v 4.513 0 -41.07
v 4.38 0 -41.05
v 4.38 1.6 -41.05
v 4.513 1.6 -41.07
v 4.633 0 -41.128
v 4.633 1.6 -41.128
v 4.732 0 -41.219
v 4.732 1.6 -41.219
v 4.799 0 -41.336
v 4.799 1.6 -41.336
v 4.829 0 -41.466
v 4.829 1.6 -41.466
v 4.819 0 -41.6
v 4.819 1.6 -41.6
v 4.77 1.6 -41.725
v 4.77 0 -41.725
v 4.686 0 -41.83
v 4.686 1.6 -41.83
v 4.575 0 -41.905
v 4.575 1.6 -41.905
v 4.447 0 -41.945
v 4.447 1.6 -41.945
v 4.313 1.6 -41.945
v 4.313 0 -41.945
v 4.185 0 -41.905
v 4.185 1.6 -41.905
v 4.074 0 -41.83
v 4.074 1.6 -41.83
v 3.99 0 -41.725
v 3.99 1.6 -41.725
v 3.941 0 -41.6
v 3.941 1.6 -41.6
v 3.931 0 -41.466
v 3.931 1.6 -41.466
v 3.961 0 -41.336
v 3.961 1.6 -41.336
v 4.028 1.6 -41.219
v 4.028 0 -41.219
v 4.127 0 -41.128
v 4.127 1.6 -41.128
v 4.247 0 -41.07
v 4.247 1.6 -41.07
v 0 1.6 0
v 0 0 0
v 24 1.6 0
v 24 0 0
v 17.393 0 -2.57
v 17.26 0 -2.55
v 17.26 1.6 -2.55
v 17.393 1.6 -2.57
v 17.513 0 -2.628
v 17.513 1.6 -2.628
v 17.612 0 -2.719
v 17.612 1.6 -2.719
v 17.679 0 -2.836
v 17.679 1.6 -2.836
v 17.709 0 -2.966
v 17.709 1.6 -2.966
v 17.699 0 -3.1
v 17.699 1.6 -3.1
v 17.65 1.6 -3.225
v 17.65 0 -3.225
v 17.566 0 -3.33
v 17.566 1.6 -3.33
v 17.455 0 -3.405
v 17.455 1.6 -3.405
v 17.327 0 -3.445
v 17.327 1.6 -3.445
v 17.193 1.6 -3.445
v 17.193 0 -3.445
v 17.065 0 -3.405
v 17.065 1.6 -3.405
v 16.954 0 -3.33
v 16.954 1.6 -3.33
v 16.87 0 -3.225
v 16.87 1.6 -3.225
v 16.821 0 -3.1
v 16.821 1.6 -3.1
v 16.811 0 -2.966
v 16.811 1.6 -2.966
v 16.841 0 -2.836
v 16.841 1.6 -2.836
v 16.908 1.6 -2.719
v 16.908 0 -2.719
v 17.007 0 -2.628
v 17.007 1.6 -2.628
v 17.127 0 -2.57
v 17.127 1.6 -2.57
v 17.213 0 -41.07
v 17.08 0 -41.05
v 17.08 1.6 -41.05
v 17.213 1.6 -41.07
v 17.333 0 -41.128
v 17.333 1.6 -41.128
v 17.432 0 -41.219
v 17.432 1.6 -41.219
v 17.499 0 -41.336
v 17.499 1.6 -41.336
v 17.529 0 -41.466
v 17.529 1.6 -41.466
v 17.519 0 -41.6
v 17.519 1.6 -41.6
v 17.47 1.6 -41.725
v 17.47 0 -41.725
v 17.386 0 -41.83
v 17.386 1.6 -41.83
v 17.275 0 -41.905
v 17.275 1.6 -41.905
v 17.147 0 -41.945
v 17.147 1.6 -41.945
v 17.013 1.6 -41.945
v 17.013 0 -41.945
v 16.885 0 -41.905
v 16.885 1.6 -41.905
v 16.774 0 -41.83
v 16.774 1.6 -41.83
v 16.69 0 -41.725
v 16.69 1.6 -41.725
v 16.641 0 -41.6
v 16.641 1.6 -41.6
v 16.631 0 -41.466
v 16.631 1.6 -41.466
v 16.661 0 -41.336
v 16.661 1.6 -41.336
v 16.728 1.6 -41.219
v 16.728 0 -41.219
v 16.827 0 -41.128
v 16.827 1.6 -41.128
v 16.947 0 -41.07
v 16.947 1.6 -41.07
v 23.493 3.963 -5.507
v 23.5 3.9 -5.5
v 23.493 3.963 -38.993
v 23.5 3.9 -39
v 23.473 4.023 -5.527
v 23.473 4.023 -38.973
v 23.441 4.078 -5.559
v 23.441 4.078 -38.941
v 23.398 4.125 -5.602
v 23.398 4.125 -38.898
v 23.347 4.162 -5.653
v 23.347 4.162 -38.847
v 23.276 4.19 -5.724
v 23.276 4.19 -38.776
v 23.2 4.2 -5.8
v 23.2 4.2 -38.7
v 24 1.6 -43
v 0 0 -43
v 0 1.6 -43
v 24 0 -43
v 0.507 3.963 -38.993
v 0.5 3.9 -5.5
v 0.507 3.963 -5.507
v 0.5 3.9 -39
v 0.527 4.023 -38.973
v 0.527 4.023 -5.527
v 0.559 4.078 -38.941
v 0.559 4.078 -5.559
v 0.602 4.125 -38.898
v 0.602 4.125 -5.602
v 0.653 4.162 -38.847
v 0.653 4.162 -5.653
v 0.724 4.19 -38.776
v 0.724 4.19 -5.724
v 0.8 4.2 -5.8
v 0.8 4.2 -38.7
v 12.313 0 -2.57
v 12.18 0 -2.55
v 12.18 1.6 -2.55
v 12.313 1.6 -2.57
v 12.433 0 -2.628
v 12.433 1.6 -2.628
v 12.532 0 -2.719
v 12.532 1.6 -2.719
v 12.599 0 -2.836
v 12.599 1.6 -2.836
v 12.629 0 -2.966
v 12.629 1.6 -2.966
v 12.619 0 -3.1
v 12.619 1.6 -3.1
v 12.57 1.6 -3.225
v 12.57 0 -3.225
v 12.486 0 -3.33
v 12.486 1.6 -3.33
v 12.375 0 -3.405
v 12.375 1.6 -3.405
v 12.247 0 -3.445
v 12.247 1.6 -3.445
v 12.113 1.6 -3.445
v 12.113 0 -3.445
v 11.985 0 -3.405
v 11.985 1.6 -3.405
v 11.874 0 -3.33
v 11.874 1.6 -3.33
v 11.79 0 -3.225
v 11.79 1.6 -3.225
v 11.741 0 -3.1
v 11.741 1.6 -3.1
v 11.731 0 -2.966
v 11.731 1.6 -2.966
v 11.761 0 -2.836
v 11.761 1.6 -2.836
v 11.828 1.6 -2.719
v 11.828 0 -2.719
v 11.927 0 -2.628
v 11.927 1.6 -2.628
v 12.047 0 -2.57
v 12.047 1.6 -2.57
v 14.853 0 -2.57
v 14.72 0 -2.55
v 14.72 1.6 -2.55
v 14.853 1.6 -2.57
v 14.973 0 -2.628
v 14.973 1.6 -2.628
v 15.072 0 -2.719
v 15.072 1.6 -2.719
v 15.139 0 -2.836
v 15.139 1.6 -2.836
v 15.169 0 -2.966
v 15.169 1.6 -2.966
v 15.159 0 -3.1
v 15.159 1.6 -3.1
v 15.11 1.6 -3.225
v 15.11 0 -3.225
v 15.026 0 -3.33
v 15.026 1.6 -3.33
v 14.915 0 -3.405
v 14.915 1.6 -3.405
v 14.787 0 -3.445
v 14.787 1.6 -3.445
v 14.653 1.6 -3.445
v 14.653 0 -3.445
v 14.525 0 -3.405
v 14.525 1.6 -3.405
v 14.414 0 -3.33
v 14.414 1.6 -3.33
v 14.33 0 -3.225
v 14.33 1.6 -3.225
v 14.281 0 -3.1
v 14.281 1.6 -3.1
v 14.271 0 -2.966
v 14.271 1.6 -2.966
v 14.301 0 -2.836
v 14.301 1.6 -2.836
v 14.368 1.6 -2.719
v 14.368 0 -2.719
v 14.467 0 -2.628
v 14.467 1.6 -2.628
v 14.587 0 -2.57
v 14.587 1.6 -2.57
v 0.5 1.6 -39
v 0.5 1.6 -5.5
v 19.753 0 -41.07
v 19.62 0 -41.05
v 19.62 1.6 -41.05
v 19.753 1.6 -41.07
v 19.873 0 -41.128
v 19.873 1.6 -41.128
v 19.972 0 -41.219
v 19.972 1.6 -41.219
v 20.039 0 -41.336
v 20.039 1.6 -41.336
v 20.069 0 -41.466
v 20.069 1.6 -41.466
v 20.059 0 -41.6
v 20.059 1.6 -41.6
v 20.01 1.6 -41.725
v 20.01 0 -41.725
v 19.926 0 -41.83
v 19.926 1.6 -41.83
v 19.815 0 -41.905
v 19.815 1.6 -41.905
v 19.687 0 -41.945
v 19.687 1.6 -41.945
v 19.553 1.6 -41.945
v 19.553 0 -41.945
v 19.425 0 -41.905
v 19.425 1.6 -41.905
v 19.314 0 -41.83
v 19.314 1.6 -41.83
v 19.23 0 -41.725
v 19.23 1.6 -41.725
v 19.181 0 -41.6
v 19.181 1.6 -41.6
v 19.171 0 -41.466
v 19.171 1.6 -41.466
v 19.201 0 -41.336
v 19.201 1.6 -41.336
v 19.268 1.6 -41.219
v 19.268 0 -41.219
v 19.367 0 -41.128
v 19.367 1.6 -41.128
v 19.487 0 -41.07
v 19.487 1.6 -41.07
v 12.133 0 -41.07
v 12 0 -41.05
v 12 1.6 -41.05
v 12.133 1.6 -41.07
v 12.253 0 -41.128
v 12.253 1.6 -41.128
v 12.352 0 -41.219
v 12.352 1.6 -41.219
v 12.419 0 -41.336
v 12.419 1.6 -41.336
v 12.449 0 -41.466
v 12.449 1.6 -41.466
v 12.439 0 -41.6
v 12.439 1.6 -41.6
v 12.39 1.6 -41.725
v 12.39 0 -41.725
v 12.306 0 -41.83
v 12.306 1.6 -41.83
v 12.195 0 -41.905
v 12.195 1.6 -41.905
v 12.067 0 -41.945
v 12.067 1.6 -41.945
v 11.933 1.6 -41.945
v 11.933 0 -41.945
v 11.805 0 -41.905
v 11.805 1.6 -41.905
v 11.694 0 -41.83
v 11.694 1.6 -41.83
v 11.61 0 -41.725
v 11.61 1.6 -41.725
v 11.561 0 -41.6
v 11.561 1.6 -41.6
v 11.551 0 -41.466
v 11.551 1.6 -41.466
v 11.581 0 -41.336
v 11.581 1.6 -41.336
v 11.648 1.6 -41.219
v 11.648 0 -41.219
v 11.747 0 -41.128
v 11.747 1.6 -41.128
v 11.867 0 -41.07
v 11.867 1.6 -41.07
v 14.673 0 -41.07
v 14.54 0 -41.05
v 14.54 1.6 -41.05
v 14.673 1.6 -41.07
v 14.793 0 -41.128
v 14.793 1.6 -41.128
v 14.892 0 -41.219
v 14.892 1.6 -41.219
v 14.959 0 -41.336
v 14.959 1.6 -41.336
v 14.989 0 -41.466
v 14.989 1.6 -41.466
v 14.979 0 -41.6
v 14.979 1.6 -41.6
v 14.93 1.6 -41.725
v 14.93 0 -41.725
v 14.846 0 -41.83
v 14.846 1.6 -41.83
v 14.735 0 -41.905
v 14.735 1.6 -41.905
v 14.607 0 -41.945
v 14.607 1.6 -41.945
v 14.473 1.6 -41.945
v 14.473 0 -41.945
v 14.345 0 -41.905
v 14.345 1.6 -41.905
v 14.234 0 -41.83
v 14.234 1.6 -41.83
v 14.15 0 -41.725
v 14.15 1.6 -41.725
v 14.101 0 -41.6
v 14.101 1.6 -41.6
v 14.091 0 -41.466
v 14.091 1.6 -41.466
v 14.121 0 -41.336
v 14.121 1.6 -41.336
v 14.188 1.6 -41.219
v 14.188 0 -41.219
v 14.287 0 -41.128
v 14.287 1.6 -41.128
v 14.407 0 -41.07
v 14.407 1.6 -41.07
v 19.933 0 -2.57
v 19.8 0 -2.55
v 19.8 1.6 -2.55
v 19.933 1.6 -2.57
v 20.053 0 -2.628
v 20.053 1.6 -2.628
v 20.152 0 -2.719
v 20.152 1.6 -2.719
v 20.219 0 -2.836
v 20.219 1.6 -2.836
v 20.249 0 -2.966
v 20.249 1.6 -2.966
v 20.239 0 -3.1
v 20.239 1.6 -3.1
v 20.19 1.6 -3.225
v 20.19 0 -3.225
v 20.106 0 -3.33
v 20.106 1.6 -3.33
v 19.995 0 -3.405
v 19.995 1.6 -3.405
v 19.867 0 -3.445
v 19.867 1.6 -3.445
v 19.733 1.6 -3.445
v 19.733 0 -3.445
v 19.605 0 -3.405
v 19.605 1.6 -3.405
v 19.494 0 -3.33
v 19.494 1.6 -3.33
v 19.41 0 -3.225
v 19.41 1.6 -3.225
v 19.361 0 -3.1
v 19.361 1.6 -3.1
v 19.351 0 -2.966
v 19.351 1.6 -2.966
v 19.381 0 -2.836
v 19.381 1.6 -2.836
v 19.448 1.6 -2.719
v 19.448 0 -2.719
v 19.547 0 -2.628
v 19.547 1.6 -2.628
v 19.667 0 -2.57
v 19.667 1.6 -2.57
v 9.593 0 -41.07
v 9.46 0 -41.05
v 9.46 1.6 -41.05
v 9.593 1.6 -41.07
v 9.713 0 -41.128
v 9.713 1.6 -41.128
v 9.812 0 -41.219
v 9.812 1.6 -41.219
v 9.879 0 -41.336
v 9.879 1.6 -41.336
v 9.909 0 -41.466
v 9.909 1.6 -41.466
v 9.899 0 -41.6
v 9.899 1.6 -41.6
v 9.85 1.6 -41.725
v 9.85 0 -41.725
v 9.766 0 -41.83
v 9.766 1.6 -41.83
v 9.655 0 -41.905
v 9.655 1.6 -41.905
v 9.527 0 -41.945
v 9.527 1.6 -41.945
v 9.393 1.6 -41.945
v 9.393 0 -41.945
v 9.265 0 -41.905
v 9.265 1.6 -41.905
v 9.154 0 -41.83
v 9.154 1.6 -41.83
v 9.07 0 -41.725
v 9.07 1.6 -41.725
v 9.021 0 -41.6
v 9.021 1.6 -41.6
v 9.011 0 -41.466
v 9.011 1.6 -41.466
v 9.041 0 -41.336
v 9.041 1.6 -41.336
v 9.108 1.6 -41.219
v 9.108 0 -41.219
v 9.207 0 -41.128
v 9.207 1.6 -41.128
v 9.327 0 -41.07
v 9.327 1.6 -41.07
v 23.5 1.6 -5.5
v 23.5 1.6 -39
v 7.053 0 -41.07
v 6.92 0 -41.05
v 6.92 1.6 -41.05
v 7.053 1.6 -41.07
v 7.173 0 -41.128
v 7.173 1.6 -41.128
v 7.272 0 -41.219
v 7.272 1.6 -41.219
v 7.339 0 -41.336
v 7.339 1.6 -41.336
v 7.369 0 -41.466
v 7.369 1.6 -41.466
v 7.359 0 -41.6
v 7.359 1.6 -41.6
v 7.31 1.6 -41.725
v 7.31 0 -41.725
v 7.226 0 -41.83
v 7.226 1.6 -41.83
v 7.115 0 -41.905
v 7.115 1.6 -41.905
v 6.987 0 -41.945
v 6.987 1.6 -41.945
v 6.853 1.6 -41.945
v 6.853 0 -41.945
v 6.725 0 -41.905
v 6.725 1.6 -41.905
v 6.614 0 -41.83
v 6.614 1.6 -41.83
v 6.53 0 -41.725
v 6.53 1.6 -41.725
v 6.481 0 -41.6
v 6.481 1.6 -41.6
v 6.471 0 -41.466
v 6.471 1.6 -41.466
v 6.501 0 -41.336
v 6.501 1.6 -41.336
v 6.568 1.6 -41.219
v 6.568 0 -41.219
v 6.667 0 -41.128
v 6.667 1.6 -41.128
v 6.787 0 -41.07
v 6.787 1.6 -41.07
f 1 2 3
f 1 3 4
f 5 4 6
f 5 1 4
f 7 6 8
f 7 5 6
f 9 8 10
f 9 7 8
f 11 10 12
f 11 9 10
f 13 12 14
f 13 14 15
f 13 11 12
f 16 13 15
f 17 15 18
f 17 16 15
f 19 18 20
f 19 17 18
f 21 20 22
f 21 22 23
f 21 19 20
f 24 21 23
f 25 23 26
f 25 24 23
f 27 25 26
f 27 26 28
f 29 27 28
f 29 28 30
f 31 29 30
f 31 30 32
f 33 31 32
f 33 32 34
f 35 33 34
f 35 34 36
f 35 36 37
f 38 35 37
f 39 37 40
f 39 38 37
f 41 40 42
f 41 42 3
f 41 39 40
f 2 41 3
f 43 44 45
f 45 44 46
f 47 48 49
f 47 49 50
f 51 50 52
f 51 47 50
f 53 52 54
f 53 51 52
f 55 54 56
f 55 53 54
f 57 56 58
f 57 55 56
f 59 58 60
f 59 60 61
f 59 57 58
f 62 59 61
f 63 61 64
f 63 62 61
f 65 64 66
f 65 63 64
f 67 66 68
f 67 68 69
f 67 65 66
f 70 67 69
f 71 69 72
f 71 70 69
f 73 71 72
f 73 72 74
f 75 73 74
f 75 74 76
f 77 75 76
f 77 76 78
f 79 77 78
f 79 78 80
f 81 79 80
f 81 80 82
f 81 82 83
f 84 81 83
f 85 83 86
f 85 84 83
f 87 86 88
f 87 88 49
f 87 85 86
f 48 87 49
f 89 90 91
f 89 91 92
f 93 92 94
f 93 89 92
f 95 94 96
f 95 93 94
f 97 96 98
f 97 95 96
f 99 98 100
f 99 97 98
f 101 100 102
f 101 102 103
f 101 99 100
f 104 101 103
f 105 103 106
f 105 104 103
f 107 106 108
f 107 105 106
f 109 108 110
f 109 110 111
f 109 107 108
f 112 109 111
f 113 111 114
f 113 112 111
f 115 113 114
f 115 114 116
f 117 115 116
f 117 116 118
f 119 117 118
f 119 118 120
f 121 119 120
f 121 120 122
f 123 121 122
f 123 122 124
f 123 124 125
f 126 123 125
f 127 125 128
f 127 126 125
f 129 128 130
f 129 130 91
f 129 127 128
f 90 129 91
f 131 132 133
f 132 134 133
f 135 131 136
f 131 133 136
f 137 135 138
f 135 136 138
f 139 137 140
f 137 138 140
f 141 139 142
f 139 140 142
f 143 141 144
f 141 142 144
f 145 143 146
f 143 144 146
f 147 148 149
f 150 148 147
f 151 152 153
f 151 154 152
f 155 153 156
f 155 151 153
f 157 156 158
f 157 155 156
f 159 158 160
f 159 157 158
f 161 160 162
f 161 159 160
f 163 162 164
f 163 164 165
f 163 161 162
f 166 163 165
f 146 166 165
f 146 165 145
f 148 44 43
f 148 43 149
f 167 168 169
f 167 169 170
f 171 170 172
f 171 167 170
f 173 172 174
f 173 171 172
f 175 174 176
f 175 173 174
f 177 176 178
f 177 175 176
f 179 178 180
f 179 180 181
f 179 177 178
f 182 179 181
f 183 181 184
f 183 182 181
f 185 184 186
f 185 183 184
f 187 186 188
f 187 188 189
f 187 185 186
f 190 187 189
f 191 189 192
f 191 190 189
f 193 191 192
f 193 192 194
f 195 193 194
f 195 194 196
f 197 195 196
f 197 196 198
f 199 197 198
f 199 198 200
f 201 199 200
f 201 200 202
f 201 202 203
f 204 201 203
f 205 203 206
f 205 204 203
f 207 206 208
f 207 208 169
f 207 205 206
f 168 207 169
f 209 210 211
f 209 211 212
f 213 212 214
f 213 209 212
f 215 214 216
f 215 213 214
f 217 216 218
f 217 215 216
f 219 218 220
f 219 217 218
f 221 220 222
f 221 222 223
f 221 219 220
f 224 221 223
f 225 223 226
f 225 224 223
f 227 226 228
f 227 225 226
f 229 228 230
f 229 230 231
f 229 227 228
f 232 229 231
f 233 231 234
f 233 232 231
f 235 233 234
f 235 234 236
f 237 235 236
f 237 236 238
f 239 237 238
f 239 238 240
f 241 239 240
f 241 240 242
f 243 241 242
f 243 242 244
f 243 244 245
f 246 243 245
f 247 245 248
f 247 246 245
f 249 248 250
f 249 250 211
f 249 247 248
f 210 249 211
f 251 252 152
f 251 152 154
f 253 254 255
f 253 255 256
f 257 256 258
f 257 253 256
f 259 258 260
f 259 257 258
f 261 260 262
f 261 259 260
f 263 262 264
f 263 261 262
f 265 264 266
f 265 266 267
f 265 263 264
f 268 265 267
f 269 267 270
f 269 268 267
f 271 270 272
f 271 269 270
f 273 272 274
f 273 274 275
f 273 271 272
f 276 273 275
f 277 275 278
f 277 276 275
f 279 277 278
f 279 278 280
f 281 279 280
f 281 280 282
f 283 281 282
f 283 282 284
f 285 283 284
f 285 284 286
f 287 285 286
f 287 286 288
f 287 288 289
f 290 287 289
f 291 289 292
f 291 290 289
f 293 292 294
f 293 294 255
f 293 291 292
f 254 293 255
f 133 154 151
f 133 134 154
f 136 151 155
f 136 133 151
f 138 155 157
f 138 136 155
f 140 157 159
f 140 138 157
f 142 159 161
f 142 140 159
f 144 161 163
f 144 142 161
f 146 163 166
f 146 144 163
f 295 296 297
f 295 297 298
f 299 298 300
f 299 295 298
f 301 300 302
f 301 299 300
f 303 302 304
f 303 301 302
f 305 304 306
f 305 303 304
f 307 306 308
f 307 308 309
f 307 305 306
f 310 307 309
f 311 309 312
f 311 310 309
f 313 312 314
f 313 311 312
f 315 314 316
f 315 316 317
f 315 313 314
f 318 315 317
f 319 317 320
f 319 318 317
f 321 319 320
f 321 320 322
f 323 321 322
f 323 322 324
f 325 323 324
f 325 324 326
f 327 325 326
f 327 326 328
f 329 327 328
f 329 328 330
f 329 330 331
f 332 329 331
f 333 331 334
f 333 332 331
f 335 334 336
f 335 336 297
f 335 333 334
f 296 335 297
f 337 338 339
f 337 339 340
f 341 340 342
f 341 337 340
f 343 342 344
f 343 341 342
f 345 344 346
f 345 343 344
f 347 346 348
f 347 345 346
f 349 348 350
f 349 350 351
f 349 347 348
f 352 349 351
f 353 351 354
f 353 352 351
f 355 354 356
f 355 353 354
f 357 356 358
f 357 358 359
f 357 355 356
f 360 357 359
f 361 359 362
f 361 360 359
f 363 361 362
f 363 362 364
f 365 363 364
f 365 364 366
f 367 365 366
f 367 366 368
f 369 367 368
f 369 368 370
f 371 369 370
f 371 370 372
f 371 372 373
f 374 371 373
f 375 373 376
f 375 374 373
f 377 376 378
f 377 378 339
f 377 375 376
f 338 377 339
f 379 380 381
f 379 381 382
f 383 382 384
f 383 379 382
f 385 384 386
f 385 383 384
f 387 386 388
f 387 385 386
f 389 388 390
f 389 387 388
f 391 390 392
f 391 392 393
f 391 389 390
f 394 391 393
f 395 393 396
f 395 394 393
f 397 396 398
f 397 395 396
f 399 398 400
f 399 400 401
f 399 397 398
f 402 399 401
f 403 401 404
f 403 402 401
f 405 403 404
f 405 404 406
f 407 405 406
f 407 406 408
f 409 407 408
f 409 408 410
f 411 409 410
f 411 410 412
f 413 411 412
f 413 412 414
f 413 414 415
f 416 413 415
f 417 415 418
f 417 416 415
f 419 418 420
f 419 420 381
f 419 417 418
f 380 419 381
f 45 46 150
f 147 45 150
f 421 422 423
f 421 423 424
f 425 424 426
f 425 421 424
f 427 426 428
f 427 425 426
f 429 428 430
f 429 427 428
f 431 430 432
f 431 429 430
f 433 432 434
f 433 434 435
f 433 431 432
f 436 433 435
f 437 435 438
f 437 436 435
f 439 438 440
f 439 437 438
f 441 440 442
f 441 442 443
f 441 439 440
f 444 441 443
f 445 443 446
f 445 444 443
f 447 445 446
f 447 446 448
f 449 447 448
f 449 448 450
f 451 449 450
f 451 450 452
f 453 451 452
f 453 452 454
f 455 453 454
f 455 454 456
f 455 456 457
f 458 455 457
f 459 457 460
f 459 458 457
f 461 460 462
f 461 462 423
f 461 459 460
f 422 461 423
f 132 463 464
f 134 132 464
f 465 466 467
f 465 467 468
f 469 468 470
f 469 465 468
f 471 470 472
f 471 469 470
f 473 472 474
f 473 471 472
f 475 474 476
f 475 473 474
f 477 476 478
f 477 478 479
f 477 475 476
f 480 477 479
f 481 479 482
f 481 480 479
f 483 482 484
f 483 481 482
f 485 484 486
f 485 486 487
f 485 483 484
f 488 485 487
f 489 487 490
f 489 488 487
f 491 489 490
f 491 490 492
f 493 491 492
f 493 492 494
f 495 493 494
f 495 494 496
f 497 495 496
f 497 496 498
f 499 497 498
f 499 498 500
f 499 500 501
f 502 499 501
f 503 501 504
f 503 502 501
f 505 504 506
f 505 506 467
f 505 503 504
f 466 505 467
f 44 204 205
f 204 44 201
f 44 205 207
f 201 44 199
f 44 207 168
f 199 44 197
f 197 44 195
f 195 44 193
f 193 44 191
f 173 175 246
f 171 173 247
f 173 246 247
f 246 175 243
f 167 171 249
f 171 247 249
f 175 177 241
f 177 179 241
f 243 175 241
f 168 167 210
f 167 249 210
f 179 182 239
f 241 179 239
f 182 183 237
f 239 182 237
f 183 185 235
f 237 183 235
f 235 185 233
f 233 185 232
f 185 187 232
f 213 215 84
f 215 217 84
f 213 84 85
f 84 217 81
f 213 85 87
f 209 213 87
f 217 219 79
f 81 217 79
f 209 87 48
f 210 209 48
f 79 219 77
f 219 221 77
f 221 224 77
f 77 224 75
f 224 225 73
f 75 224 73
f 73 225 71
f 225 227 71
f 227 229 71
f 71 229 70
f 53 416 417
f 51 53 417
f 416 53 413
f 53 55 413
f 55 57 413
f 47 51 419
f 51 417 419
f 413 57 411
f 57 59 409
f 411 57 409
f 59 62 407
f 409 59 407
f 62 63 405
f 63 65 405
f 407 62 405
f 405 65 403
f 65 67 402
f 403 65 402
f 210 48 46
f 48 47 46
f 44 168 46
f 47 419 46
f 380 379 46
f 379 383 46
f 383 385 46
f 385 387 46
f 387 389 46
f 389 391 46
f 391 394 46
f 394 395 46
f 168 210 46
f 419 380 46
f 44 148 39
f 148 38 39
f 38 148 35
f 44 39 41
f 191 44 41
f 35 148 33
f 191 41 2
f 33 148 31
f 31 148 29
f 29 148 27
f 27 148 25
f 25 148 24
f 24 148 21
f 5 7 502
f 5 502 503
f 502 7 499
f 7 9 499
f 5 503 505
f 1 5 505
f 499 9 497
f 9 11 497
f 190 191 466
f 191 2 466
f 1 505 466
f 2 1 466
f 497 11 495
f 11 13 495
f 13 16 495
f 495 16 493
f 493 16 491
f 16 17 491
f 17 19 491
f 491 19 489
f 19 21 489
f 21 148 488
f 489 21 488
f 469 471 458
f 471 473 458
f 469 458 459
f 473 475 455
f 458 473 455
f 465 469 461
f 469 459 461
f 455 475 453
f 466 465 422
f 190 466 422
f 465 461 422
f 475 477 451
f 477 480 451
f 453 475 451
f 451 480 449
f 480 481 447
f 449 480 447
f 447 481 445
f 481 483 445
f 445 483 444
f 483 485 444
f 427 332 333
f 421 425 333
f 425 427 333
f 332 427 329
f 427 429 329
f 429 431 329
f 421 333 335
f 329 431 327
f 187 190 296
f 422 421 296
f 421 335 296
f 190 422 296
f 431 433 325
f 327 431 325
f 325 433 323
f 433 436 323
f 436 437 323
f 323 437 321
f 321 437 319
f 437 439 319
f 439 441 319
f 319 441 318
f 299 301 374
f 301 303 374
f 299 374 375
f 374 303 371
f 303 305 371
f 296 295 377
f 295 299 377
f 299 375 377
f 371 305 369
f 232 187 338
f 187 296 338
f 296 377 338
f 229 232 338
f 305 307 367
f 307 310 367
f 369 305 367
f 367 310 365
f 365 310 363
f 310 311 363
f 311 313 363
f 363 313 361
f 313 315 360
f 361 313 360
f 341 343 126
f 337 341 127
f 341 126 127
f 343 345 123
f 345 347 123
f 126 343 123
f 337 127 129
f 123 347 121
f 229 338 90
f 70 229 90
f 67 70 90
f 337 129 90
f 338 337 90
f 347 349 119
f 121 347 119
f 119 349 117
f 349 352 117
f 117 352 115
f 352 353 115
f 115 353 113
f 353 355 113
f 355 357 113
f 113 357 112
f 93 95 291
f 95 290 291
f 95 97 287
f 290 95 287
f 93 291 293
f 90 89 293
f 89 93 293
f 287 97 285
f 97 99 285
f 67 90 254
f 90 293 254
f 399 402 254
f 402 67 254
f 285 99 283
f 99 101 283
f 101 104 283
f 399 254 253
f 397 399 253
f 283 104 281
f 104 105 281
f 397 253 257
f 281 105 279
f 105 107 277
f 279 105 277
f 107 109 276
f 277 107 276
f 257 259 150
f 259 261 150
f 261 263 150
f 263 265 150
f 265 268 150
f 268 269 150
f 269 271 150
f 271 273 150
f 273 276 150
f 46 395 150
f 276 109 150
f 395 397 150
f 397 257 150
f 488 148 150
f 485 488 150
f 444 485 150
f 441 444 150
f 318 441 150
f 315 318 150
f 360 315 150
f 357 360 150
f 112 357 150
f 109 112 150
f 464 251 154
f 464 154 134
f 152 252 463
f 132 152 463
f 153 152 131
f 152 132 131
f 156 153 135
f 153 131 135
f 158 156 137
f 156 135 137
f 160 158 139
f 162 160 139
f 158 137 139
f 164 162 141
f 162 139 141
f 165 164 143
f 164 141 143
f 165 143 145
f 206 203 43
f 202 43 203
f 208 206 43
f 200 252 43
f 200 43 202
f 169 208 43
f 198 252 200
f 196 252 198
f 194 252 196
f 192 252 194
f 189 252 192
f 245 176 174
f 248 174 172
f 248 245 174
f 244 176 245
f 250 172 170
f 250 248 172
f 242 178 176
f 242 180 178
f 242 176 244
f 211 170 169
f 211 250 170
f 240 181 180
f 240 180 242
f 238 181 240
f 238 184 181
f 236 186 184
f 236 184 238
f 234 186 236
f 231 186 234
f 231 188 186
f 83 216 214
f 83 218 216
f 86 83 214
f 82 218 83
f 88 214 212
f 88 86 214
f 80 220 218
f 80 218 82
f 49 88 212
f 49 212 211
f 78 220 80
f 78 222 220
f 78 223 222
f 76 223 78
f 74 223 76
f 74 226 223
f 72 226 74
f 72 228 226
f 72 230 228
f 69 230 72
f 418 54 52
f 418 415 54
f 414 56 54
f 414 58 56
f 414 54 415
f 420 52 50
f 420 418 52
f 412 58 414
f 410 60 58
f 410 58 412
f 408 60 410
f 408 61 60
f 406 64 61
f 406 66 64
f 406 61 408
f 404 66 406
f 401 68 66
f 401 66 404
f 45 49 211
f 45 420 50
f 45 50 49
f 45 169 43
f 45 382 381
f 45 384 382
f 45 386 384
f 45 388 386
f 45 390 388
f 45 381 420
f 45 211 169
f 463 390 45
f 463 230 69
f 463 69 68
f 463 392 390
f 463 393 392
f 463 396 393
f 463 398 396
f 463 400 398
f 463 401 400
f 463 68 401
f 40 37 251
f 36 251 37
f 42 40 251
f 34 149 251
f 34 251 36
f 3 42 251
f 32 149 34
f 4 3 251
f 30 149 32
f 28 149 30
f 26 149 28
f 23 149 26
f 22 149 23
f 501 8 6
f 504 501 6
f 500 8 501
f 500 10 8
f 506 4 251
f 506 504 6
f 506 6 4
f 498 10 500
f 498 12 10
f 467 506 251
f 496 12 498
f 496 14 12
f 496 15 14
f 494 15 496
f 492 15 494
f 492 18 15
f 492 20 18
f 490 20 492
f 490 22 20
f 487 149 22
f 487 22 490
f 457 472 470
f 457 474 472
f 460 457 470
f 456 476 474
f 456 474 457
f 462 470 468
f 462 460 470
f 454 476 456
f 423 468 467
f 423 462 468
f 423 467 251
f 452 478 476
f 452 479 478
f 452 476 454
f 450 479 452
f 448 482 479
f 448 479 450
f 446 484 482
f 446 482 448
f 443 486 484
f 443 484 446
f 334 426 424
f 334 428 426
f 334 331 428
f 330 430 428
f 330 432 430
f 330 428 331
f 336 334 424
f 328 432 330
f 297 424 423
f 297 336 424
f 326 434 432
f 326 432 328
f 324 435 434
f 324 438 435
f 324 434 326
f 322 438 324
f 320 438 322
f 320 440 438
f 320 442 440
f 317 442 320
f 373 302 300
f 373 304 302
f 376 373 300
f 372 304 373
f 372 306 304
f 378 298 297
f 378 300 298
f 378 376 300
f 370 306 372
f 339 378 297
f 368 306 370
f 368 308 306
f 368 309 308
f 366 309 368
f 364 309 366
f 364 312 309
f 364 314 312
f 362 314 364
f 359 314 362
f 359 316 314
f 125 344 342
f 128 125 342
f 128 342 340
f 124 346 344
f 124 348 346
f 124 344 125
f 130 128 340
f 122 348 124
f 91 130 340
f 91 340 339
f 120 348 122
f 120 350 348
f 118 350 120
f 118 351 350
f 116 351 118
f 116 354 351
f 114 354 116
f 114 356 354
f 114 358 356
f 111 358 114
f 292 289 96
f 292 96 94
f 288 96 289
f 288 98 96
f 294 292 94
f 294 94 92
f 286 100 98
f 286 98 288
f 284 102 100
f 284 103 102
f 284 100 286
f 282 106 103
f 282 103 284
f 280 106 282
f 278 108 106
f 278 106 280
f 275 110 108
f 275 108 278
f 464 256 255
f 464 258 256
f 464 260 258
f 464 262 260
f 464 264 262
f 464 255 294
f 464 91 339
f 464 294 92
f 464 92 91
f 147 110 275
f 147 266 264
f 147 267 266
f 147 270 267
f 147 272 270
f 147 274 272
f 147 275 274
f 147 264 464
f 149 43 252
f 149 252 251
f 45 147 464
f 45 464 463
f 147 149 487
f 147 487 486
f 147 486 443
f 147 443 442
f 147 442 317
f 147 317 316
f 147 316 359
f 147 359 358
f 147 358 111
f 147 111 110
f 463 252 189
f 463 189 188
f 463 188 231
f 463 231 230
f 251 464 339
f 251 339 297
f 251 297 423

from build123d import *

# Parameters (mm, degrees)
SKETCH1_W           = 24
SKETCH1_H           = 43
SKETCH1_R           = 0.45
BOSS_EXTRUDE1_DEPTH = 1.6
SKETCH2_W           = 23
SKETCH2_H           = 33.5
BOSS_EXTRUDE2_DEPTH = 2.6
FILLET1_R           = 0.3


with BuildPart() as part:
    # Sketch1 → Boss-Extrude1 (new body)
    with BuildSketch(Plane(origin=(0, 0, 0), x_dir=(1, 0, 0), z_dir=(0, 1, 0))):
        with Locations((12, 21.5)):
            Rectangle(SKETCH1_W, SKETCH1_H)
        with Locations(Location((19.62, 41.5, 0), (0, 0, 270))):
            Circle(SKETCH1_R, mode=Mode.SUBTRACT)
        with Locations(Location((17.08, 41.5, 0), (0, 0, 270))):
            Circle(SKETCH1_R, mode=Mode.SUBTRACT)
        with Locations(Location((14.54, 41.5, 0), (0, 0, 270))):
            Circle(SKETCH1_R, mode=Mode.SUBTRACT)
        with Locations(Location((12, 41.5, 0), (0, 0, 270))):
            Circle(SKETCH1_R, mode=Mode.SUBTRACT)
        with Locations(Location((9.46, 41.5, 0), (0, 0, 270))):
            Circle(SKETCH1_R, mode=Mode.SUBTRACT)
        with Locations(Location((6.92, 41.5, 0), (0, 0, 270))):
            Circle(SKETCH1_R, mode=Mode.SUBTRACT)
        with Locations(Location((4.38, 41.5, 0), (0, 0, 270))):
            Circle(SKETCH1_R, mode=Mode.SUBTRACT)
        with Locations(Location((19.8, 3, 0), (0, 0, 270))):
            Circle(SKETCH1_R, mode=Mode.SUBTRACT)
        with Locations(Location((17.26, 3, 0), (0, 0, 270))):
            Circle(SKETCH1_R, mode=Mode.SUBTRACT)
        with Locations(Location((14.72, 3, 0), (0, 0, 270))):
            Circle(SKETCH1_R, mode=Mode.SUBTRACT)
        with Locations(Location((12.18, 3, 0), (0, 0, 270))):
            Circle(SKETCH1_R, mode=Mode.SUBTRACT)
    extrude(amount=BOSS_EXTRUDE1_DEPTH)

    # Sketch2 → Boss-Extrude2 (add)
    with BuildSketch(Plane(origin=(0, 1.6, 0), x_dir=(1, 0, 0), z_dir=(0, 1, 0))):
        with Locations((12, 22.25)):
            Rectangle(SKETCH2_W, SKETCH2_H)
    extrude(amount=BOSS_EXTRUDE2_DEPTH)

    # Fillet1
    fillet1_edges = [part.edges().sort_by_distance(p)[0] for p in [
        (0.5, 4.2, -22.25),
        (12, 4.2, -5.5),
        (23.5, 4.2, -22.25),
        (12, 4.2, -39),
    ]]
    fillet(fillet1_edges, radius=FILLET1_R)


solid = part.part
